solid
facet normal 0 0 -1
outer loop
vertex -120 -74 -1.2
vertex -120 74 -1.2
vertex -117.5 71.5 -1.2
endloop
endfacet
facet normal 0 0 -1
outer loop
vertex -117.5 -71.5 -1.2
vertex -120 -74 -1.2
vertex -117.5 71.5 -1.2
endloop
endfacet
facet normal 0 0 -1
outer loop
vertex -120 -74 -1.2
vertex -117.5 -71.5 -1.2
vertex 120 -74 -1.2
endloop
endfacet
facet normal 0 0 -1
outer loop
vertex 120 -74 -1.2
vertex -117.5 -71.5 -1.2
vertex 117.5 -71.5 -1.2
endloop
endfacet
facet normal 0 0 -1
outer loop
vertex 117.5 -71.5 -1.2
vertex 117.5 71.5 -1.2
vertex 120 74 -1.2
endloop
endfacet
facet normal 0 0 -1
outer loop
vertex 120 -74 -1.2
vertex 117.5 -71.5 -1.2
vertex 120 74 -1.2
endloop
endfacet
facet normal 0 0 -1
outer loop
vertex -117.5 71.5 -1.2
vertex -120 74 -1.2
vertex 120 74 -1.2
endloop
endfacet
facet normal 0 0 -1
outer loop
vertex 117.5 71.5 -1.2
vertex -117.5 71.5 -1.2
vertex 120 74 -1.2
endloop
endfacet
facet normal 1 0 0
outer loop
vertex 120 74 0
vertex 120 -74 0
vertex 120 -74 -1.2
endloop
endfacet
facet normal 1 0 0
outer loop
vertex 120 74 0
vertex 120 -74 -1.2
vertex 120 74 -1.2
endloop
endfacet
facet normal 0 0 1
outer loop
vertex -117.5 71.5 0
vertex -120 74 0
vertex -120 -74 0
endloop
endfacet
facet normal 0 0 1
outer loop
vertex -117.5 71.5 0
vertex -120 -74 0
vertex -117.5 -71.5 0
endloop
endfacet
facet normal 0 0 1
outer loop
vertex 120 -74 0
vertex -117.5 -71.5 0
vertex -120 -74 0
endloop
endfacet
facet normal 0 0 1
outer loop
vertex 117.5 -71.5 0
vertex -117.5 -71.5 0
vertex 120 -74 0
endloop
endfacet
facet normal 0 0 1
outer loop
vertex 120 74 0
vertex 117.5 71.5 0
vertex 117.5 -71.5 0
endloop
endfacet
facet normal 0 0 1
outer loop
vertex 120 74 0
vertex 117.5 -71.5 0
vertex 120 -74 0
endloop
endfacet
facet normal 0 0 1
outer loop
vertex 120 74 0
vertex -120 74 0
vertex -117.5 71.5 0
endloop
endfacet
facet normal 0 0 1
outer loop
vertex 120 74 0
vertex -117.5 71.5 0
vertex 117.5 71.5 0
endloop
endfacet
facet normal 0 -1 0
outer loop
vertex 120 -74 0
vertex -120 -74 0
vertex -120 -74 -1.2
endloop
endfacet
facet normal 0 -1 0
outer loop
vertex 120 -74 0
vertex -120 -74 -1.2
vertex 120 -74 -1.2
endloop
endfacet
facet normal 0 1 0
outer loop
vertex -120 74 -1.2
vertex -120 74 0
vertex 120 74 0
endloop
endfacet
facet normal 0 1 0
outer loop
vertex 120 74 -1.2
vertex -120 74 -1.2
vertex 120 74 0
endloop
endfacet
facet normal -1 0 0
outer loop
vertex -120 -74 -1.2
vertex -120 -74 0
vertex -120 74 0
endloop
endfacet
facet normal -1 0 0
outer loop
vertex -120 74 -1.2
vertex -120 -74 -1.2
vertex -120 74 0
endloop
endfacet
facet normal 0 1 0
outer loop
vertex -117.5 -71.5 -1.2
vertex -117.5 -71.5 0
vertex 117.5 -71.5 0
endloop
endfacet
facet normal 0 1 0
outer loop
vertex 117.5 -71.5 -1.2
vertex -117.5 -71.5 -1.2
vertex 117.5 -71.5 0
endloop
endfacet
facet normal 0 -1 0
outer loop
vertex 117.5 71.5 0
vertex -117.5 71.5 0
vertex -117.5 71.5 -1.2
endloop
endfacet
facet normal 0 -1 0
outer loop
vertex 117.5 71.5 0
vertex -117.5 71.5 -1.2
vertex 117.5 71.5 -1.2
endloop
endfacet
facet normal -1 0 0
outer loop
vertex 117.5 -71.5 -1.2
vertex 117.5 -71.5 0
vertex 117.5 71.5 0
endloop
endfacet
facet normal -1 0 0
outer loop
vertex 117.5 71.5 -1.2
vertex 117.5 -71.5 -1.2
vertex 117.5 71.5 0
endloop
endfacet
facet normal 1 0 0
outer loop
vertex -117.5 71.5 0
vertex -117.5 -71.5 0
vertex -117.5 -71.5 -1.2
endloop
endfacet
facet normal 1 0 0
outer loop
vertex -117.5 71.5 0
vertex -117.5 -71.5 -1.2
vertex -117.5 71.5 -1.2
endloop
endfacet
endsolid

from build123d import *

# Parameters (mm, degrees)
SKETCH1_W           = 240
SKETCH1_H           = 148
SKETCH1_W_2         = 235
SKETCH1_H_2         = 143
BOSS_EXTRUDE1_DEPTH = 1.2


with BuildPart() as part:
    # Sketch1 → Boss-Extrude1 (new body)
    with BuildSketch(Plane.XY):
        Rectangle(SKETCH1_W, SKETCH1_H)
        Rectangle(SKETCH1_W_2, SKETCH1_H_2, mode=Mode.SUBTRACT)
    extrude(amount=-BOSS_EXTRUDE1_DEPTH)


solid = part.part
